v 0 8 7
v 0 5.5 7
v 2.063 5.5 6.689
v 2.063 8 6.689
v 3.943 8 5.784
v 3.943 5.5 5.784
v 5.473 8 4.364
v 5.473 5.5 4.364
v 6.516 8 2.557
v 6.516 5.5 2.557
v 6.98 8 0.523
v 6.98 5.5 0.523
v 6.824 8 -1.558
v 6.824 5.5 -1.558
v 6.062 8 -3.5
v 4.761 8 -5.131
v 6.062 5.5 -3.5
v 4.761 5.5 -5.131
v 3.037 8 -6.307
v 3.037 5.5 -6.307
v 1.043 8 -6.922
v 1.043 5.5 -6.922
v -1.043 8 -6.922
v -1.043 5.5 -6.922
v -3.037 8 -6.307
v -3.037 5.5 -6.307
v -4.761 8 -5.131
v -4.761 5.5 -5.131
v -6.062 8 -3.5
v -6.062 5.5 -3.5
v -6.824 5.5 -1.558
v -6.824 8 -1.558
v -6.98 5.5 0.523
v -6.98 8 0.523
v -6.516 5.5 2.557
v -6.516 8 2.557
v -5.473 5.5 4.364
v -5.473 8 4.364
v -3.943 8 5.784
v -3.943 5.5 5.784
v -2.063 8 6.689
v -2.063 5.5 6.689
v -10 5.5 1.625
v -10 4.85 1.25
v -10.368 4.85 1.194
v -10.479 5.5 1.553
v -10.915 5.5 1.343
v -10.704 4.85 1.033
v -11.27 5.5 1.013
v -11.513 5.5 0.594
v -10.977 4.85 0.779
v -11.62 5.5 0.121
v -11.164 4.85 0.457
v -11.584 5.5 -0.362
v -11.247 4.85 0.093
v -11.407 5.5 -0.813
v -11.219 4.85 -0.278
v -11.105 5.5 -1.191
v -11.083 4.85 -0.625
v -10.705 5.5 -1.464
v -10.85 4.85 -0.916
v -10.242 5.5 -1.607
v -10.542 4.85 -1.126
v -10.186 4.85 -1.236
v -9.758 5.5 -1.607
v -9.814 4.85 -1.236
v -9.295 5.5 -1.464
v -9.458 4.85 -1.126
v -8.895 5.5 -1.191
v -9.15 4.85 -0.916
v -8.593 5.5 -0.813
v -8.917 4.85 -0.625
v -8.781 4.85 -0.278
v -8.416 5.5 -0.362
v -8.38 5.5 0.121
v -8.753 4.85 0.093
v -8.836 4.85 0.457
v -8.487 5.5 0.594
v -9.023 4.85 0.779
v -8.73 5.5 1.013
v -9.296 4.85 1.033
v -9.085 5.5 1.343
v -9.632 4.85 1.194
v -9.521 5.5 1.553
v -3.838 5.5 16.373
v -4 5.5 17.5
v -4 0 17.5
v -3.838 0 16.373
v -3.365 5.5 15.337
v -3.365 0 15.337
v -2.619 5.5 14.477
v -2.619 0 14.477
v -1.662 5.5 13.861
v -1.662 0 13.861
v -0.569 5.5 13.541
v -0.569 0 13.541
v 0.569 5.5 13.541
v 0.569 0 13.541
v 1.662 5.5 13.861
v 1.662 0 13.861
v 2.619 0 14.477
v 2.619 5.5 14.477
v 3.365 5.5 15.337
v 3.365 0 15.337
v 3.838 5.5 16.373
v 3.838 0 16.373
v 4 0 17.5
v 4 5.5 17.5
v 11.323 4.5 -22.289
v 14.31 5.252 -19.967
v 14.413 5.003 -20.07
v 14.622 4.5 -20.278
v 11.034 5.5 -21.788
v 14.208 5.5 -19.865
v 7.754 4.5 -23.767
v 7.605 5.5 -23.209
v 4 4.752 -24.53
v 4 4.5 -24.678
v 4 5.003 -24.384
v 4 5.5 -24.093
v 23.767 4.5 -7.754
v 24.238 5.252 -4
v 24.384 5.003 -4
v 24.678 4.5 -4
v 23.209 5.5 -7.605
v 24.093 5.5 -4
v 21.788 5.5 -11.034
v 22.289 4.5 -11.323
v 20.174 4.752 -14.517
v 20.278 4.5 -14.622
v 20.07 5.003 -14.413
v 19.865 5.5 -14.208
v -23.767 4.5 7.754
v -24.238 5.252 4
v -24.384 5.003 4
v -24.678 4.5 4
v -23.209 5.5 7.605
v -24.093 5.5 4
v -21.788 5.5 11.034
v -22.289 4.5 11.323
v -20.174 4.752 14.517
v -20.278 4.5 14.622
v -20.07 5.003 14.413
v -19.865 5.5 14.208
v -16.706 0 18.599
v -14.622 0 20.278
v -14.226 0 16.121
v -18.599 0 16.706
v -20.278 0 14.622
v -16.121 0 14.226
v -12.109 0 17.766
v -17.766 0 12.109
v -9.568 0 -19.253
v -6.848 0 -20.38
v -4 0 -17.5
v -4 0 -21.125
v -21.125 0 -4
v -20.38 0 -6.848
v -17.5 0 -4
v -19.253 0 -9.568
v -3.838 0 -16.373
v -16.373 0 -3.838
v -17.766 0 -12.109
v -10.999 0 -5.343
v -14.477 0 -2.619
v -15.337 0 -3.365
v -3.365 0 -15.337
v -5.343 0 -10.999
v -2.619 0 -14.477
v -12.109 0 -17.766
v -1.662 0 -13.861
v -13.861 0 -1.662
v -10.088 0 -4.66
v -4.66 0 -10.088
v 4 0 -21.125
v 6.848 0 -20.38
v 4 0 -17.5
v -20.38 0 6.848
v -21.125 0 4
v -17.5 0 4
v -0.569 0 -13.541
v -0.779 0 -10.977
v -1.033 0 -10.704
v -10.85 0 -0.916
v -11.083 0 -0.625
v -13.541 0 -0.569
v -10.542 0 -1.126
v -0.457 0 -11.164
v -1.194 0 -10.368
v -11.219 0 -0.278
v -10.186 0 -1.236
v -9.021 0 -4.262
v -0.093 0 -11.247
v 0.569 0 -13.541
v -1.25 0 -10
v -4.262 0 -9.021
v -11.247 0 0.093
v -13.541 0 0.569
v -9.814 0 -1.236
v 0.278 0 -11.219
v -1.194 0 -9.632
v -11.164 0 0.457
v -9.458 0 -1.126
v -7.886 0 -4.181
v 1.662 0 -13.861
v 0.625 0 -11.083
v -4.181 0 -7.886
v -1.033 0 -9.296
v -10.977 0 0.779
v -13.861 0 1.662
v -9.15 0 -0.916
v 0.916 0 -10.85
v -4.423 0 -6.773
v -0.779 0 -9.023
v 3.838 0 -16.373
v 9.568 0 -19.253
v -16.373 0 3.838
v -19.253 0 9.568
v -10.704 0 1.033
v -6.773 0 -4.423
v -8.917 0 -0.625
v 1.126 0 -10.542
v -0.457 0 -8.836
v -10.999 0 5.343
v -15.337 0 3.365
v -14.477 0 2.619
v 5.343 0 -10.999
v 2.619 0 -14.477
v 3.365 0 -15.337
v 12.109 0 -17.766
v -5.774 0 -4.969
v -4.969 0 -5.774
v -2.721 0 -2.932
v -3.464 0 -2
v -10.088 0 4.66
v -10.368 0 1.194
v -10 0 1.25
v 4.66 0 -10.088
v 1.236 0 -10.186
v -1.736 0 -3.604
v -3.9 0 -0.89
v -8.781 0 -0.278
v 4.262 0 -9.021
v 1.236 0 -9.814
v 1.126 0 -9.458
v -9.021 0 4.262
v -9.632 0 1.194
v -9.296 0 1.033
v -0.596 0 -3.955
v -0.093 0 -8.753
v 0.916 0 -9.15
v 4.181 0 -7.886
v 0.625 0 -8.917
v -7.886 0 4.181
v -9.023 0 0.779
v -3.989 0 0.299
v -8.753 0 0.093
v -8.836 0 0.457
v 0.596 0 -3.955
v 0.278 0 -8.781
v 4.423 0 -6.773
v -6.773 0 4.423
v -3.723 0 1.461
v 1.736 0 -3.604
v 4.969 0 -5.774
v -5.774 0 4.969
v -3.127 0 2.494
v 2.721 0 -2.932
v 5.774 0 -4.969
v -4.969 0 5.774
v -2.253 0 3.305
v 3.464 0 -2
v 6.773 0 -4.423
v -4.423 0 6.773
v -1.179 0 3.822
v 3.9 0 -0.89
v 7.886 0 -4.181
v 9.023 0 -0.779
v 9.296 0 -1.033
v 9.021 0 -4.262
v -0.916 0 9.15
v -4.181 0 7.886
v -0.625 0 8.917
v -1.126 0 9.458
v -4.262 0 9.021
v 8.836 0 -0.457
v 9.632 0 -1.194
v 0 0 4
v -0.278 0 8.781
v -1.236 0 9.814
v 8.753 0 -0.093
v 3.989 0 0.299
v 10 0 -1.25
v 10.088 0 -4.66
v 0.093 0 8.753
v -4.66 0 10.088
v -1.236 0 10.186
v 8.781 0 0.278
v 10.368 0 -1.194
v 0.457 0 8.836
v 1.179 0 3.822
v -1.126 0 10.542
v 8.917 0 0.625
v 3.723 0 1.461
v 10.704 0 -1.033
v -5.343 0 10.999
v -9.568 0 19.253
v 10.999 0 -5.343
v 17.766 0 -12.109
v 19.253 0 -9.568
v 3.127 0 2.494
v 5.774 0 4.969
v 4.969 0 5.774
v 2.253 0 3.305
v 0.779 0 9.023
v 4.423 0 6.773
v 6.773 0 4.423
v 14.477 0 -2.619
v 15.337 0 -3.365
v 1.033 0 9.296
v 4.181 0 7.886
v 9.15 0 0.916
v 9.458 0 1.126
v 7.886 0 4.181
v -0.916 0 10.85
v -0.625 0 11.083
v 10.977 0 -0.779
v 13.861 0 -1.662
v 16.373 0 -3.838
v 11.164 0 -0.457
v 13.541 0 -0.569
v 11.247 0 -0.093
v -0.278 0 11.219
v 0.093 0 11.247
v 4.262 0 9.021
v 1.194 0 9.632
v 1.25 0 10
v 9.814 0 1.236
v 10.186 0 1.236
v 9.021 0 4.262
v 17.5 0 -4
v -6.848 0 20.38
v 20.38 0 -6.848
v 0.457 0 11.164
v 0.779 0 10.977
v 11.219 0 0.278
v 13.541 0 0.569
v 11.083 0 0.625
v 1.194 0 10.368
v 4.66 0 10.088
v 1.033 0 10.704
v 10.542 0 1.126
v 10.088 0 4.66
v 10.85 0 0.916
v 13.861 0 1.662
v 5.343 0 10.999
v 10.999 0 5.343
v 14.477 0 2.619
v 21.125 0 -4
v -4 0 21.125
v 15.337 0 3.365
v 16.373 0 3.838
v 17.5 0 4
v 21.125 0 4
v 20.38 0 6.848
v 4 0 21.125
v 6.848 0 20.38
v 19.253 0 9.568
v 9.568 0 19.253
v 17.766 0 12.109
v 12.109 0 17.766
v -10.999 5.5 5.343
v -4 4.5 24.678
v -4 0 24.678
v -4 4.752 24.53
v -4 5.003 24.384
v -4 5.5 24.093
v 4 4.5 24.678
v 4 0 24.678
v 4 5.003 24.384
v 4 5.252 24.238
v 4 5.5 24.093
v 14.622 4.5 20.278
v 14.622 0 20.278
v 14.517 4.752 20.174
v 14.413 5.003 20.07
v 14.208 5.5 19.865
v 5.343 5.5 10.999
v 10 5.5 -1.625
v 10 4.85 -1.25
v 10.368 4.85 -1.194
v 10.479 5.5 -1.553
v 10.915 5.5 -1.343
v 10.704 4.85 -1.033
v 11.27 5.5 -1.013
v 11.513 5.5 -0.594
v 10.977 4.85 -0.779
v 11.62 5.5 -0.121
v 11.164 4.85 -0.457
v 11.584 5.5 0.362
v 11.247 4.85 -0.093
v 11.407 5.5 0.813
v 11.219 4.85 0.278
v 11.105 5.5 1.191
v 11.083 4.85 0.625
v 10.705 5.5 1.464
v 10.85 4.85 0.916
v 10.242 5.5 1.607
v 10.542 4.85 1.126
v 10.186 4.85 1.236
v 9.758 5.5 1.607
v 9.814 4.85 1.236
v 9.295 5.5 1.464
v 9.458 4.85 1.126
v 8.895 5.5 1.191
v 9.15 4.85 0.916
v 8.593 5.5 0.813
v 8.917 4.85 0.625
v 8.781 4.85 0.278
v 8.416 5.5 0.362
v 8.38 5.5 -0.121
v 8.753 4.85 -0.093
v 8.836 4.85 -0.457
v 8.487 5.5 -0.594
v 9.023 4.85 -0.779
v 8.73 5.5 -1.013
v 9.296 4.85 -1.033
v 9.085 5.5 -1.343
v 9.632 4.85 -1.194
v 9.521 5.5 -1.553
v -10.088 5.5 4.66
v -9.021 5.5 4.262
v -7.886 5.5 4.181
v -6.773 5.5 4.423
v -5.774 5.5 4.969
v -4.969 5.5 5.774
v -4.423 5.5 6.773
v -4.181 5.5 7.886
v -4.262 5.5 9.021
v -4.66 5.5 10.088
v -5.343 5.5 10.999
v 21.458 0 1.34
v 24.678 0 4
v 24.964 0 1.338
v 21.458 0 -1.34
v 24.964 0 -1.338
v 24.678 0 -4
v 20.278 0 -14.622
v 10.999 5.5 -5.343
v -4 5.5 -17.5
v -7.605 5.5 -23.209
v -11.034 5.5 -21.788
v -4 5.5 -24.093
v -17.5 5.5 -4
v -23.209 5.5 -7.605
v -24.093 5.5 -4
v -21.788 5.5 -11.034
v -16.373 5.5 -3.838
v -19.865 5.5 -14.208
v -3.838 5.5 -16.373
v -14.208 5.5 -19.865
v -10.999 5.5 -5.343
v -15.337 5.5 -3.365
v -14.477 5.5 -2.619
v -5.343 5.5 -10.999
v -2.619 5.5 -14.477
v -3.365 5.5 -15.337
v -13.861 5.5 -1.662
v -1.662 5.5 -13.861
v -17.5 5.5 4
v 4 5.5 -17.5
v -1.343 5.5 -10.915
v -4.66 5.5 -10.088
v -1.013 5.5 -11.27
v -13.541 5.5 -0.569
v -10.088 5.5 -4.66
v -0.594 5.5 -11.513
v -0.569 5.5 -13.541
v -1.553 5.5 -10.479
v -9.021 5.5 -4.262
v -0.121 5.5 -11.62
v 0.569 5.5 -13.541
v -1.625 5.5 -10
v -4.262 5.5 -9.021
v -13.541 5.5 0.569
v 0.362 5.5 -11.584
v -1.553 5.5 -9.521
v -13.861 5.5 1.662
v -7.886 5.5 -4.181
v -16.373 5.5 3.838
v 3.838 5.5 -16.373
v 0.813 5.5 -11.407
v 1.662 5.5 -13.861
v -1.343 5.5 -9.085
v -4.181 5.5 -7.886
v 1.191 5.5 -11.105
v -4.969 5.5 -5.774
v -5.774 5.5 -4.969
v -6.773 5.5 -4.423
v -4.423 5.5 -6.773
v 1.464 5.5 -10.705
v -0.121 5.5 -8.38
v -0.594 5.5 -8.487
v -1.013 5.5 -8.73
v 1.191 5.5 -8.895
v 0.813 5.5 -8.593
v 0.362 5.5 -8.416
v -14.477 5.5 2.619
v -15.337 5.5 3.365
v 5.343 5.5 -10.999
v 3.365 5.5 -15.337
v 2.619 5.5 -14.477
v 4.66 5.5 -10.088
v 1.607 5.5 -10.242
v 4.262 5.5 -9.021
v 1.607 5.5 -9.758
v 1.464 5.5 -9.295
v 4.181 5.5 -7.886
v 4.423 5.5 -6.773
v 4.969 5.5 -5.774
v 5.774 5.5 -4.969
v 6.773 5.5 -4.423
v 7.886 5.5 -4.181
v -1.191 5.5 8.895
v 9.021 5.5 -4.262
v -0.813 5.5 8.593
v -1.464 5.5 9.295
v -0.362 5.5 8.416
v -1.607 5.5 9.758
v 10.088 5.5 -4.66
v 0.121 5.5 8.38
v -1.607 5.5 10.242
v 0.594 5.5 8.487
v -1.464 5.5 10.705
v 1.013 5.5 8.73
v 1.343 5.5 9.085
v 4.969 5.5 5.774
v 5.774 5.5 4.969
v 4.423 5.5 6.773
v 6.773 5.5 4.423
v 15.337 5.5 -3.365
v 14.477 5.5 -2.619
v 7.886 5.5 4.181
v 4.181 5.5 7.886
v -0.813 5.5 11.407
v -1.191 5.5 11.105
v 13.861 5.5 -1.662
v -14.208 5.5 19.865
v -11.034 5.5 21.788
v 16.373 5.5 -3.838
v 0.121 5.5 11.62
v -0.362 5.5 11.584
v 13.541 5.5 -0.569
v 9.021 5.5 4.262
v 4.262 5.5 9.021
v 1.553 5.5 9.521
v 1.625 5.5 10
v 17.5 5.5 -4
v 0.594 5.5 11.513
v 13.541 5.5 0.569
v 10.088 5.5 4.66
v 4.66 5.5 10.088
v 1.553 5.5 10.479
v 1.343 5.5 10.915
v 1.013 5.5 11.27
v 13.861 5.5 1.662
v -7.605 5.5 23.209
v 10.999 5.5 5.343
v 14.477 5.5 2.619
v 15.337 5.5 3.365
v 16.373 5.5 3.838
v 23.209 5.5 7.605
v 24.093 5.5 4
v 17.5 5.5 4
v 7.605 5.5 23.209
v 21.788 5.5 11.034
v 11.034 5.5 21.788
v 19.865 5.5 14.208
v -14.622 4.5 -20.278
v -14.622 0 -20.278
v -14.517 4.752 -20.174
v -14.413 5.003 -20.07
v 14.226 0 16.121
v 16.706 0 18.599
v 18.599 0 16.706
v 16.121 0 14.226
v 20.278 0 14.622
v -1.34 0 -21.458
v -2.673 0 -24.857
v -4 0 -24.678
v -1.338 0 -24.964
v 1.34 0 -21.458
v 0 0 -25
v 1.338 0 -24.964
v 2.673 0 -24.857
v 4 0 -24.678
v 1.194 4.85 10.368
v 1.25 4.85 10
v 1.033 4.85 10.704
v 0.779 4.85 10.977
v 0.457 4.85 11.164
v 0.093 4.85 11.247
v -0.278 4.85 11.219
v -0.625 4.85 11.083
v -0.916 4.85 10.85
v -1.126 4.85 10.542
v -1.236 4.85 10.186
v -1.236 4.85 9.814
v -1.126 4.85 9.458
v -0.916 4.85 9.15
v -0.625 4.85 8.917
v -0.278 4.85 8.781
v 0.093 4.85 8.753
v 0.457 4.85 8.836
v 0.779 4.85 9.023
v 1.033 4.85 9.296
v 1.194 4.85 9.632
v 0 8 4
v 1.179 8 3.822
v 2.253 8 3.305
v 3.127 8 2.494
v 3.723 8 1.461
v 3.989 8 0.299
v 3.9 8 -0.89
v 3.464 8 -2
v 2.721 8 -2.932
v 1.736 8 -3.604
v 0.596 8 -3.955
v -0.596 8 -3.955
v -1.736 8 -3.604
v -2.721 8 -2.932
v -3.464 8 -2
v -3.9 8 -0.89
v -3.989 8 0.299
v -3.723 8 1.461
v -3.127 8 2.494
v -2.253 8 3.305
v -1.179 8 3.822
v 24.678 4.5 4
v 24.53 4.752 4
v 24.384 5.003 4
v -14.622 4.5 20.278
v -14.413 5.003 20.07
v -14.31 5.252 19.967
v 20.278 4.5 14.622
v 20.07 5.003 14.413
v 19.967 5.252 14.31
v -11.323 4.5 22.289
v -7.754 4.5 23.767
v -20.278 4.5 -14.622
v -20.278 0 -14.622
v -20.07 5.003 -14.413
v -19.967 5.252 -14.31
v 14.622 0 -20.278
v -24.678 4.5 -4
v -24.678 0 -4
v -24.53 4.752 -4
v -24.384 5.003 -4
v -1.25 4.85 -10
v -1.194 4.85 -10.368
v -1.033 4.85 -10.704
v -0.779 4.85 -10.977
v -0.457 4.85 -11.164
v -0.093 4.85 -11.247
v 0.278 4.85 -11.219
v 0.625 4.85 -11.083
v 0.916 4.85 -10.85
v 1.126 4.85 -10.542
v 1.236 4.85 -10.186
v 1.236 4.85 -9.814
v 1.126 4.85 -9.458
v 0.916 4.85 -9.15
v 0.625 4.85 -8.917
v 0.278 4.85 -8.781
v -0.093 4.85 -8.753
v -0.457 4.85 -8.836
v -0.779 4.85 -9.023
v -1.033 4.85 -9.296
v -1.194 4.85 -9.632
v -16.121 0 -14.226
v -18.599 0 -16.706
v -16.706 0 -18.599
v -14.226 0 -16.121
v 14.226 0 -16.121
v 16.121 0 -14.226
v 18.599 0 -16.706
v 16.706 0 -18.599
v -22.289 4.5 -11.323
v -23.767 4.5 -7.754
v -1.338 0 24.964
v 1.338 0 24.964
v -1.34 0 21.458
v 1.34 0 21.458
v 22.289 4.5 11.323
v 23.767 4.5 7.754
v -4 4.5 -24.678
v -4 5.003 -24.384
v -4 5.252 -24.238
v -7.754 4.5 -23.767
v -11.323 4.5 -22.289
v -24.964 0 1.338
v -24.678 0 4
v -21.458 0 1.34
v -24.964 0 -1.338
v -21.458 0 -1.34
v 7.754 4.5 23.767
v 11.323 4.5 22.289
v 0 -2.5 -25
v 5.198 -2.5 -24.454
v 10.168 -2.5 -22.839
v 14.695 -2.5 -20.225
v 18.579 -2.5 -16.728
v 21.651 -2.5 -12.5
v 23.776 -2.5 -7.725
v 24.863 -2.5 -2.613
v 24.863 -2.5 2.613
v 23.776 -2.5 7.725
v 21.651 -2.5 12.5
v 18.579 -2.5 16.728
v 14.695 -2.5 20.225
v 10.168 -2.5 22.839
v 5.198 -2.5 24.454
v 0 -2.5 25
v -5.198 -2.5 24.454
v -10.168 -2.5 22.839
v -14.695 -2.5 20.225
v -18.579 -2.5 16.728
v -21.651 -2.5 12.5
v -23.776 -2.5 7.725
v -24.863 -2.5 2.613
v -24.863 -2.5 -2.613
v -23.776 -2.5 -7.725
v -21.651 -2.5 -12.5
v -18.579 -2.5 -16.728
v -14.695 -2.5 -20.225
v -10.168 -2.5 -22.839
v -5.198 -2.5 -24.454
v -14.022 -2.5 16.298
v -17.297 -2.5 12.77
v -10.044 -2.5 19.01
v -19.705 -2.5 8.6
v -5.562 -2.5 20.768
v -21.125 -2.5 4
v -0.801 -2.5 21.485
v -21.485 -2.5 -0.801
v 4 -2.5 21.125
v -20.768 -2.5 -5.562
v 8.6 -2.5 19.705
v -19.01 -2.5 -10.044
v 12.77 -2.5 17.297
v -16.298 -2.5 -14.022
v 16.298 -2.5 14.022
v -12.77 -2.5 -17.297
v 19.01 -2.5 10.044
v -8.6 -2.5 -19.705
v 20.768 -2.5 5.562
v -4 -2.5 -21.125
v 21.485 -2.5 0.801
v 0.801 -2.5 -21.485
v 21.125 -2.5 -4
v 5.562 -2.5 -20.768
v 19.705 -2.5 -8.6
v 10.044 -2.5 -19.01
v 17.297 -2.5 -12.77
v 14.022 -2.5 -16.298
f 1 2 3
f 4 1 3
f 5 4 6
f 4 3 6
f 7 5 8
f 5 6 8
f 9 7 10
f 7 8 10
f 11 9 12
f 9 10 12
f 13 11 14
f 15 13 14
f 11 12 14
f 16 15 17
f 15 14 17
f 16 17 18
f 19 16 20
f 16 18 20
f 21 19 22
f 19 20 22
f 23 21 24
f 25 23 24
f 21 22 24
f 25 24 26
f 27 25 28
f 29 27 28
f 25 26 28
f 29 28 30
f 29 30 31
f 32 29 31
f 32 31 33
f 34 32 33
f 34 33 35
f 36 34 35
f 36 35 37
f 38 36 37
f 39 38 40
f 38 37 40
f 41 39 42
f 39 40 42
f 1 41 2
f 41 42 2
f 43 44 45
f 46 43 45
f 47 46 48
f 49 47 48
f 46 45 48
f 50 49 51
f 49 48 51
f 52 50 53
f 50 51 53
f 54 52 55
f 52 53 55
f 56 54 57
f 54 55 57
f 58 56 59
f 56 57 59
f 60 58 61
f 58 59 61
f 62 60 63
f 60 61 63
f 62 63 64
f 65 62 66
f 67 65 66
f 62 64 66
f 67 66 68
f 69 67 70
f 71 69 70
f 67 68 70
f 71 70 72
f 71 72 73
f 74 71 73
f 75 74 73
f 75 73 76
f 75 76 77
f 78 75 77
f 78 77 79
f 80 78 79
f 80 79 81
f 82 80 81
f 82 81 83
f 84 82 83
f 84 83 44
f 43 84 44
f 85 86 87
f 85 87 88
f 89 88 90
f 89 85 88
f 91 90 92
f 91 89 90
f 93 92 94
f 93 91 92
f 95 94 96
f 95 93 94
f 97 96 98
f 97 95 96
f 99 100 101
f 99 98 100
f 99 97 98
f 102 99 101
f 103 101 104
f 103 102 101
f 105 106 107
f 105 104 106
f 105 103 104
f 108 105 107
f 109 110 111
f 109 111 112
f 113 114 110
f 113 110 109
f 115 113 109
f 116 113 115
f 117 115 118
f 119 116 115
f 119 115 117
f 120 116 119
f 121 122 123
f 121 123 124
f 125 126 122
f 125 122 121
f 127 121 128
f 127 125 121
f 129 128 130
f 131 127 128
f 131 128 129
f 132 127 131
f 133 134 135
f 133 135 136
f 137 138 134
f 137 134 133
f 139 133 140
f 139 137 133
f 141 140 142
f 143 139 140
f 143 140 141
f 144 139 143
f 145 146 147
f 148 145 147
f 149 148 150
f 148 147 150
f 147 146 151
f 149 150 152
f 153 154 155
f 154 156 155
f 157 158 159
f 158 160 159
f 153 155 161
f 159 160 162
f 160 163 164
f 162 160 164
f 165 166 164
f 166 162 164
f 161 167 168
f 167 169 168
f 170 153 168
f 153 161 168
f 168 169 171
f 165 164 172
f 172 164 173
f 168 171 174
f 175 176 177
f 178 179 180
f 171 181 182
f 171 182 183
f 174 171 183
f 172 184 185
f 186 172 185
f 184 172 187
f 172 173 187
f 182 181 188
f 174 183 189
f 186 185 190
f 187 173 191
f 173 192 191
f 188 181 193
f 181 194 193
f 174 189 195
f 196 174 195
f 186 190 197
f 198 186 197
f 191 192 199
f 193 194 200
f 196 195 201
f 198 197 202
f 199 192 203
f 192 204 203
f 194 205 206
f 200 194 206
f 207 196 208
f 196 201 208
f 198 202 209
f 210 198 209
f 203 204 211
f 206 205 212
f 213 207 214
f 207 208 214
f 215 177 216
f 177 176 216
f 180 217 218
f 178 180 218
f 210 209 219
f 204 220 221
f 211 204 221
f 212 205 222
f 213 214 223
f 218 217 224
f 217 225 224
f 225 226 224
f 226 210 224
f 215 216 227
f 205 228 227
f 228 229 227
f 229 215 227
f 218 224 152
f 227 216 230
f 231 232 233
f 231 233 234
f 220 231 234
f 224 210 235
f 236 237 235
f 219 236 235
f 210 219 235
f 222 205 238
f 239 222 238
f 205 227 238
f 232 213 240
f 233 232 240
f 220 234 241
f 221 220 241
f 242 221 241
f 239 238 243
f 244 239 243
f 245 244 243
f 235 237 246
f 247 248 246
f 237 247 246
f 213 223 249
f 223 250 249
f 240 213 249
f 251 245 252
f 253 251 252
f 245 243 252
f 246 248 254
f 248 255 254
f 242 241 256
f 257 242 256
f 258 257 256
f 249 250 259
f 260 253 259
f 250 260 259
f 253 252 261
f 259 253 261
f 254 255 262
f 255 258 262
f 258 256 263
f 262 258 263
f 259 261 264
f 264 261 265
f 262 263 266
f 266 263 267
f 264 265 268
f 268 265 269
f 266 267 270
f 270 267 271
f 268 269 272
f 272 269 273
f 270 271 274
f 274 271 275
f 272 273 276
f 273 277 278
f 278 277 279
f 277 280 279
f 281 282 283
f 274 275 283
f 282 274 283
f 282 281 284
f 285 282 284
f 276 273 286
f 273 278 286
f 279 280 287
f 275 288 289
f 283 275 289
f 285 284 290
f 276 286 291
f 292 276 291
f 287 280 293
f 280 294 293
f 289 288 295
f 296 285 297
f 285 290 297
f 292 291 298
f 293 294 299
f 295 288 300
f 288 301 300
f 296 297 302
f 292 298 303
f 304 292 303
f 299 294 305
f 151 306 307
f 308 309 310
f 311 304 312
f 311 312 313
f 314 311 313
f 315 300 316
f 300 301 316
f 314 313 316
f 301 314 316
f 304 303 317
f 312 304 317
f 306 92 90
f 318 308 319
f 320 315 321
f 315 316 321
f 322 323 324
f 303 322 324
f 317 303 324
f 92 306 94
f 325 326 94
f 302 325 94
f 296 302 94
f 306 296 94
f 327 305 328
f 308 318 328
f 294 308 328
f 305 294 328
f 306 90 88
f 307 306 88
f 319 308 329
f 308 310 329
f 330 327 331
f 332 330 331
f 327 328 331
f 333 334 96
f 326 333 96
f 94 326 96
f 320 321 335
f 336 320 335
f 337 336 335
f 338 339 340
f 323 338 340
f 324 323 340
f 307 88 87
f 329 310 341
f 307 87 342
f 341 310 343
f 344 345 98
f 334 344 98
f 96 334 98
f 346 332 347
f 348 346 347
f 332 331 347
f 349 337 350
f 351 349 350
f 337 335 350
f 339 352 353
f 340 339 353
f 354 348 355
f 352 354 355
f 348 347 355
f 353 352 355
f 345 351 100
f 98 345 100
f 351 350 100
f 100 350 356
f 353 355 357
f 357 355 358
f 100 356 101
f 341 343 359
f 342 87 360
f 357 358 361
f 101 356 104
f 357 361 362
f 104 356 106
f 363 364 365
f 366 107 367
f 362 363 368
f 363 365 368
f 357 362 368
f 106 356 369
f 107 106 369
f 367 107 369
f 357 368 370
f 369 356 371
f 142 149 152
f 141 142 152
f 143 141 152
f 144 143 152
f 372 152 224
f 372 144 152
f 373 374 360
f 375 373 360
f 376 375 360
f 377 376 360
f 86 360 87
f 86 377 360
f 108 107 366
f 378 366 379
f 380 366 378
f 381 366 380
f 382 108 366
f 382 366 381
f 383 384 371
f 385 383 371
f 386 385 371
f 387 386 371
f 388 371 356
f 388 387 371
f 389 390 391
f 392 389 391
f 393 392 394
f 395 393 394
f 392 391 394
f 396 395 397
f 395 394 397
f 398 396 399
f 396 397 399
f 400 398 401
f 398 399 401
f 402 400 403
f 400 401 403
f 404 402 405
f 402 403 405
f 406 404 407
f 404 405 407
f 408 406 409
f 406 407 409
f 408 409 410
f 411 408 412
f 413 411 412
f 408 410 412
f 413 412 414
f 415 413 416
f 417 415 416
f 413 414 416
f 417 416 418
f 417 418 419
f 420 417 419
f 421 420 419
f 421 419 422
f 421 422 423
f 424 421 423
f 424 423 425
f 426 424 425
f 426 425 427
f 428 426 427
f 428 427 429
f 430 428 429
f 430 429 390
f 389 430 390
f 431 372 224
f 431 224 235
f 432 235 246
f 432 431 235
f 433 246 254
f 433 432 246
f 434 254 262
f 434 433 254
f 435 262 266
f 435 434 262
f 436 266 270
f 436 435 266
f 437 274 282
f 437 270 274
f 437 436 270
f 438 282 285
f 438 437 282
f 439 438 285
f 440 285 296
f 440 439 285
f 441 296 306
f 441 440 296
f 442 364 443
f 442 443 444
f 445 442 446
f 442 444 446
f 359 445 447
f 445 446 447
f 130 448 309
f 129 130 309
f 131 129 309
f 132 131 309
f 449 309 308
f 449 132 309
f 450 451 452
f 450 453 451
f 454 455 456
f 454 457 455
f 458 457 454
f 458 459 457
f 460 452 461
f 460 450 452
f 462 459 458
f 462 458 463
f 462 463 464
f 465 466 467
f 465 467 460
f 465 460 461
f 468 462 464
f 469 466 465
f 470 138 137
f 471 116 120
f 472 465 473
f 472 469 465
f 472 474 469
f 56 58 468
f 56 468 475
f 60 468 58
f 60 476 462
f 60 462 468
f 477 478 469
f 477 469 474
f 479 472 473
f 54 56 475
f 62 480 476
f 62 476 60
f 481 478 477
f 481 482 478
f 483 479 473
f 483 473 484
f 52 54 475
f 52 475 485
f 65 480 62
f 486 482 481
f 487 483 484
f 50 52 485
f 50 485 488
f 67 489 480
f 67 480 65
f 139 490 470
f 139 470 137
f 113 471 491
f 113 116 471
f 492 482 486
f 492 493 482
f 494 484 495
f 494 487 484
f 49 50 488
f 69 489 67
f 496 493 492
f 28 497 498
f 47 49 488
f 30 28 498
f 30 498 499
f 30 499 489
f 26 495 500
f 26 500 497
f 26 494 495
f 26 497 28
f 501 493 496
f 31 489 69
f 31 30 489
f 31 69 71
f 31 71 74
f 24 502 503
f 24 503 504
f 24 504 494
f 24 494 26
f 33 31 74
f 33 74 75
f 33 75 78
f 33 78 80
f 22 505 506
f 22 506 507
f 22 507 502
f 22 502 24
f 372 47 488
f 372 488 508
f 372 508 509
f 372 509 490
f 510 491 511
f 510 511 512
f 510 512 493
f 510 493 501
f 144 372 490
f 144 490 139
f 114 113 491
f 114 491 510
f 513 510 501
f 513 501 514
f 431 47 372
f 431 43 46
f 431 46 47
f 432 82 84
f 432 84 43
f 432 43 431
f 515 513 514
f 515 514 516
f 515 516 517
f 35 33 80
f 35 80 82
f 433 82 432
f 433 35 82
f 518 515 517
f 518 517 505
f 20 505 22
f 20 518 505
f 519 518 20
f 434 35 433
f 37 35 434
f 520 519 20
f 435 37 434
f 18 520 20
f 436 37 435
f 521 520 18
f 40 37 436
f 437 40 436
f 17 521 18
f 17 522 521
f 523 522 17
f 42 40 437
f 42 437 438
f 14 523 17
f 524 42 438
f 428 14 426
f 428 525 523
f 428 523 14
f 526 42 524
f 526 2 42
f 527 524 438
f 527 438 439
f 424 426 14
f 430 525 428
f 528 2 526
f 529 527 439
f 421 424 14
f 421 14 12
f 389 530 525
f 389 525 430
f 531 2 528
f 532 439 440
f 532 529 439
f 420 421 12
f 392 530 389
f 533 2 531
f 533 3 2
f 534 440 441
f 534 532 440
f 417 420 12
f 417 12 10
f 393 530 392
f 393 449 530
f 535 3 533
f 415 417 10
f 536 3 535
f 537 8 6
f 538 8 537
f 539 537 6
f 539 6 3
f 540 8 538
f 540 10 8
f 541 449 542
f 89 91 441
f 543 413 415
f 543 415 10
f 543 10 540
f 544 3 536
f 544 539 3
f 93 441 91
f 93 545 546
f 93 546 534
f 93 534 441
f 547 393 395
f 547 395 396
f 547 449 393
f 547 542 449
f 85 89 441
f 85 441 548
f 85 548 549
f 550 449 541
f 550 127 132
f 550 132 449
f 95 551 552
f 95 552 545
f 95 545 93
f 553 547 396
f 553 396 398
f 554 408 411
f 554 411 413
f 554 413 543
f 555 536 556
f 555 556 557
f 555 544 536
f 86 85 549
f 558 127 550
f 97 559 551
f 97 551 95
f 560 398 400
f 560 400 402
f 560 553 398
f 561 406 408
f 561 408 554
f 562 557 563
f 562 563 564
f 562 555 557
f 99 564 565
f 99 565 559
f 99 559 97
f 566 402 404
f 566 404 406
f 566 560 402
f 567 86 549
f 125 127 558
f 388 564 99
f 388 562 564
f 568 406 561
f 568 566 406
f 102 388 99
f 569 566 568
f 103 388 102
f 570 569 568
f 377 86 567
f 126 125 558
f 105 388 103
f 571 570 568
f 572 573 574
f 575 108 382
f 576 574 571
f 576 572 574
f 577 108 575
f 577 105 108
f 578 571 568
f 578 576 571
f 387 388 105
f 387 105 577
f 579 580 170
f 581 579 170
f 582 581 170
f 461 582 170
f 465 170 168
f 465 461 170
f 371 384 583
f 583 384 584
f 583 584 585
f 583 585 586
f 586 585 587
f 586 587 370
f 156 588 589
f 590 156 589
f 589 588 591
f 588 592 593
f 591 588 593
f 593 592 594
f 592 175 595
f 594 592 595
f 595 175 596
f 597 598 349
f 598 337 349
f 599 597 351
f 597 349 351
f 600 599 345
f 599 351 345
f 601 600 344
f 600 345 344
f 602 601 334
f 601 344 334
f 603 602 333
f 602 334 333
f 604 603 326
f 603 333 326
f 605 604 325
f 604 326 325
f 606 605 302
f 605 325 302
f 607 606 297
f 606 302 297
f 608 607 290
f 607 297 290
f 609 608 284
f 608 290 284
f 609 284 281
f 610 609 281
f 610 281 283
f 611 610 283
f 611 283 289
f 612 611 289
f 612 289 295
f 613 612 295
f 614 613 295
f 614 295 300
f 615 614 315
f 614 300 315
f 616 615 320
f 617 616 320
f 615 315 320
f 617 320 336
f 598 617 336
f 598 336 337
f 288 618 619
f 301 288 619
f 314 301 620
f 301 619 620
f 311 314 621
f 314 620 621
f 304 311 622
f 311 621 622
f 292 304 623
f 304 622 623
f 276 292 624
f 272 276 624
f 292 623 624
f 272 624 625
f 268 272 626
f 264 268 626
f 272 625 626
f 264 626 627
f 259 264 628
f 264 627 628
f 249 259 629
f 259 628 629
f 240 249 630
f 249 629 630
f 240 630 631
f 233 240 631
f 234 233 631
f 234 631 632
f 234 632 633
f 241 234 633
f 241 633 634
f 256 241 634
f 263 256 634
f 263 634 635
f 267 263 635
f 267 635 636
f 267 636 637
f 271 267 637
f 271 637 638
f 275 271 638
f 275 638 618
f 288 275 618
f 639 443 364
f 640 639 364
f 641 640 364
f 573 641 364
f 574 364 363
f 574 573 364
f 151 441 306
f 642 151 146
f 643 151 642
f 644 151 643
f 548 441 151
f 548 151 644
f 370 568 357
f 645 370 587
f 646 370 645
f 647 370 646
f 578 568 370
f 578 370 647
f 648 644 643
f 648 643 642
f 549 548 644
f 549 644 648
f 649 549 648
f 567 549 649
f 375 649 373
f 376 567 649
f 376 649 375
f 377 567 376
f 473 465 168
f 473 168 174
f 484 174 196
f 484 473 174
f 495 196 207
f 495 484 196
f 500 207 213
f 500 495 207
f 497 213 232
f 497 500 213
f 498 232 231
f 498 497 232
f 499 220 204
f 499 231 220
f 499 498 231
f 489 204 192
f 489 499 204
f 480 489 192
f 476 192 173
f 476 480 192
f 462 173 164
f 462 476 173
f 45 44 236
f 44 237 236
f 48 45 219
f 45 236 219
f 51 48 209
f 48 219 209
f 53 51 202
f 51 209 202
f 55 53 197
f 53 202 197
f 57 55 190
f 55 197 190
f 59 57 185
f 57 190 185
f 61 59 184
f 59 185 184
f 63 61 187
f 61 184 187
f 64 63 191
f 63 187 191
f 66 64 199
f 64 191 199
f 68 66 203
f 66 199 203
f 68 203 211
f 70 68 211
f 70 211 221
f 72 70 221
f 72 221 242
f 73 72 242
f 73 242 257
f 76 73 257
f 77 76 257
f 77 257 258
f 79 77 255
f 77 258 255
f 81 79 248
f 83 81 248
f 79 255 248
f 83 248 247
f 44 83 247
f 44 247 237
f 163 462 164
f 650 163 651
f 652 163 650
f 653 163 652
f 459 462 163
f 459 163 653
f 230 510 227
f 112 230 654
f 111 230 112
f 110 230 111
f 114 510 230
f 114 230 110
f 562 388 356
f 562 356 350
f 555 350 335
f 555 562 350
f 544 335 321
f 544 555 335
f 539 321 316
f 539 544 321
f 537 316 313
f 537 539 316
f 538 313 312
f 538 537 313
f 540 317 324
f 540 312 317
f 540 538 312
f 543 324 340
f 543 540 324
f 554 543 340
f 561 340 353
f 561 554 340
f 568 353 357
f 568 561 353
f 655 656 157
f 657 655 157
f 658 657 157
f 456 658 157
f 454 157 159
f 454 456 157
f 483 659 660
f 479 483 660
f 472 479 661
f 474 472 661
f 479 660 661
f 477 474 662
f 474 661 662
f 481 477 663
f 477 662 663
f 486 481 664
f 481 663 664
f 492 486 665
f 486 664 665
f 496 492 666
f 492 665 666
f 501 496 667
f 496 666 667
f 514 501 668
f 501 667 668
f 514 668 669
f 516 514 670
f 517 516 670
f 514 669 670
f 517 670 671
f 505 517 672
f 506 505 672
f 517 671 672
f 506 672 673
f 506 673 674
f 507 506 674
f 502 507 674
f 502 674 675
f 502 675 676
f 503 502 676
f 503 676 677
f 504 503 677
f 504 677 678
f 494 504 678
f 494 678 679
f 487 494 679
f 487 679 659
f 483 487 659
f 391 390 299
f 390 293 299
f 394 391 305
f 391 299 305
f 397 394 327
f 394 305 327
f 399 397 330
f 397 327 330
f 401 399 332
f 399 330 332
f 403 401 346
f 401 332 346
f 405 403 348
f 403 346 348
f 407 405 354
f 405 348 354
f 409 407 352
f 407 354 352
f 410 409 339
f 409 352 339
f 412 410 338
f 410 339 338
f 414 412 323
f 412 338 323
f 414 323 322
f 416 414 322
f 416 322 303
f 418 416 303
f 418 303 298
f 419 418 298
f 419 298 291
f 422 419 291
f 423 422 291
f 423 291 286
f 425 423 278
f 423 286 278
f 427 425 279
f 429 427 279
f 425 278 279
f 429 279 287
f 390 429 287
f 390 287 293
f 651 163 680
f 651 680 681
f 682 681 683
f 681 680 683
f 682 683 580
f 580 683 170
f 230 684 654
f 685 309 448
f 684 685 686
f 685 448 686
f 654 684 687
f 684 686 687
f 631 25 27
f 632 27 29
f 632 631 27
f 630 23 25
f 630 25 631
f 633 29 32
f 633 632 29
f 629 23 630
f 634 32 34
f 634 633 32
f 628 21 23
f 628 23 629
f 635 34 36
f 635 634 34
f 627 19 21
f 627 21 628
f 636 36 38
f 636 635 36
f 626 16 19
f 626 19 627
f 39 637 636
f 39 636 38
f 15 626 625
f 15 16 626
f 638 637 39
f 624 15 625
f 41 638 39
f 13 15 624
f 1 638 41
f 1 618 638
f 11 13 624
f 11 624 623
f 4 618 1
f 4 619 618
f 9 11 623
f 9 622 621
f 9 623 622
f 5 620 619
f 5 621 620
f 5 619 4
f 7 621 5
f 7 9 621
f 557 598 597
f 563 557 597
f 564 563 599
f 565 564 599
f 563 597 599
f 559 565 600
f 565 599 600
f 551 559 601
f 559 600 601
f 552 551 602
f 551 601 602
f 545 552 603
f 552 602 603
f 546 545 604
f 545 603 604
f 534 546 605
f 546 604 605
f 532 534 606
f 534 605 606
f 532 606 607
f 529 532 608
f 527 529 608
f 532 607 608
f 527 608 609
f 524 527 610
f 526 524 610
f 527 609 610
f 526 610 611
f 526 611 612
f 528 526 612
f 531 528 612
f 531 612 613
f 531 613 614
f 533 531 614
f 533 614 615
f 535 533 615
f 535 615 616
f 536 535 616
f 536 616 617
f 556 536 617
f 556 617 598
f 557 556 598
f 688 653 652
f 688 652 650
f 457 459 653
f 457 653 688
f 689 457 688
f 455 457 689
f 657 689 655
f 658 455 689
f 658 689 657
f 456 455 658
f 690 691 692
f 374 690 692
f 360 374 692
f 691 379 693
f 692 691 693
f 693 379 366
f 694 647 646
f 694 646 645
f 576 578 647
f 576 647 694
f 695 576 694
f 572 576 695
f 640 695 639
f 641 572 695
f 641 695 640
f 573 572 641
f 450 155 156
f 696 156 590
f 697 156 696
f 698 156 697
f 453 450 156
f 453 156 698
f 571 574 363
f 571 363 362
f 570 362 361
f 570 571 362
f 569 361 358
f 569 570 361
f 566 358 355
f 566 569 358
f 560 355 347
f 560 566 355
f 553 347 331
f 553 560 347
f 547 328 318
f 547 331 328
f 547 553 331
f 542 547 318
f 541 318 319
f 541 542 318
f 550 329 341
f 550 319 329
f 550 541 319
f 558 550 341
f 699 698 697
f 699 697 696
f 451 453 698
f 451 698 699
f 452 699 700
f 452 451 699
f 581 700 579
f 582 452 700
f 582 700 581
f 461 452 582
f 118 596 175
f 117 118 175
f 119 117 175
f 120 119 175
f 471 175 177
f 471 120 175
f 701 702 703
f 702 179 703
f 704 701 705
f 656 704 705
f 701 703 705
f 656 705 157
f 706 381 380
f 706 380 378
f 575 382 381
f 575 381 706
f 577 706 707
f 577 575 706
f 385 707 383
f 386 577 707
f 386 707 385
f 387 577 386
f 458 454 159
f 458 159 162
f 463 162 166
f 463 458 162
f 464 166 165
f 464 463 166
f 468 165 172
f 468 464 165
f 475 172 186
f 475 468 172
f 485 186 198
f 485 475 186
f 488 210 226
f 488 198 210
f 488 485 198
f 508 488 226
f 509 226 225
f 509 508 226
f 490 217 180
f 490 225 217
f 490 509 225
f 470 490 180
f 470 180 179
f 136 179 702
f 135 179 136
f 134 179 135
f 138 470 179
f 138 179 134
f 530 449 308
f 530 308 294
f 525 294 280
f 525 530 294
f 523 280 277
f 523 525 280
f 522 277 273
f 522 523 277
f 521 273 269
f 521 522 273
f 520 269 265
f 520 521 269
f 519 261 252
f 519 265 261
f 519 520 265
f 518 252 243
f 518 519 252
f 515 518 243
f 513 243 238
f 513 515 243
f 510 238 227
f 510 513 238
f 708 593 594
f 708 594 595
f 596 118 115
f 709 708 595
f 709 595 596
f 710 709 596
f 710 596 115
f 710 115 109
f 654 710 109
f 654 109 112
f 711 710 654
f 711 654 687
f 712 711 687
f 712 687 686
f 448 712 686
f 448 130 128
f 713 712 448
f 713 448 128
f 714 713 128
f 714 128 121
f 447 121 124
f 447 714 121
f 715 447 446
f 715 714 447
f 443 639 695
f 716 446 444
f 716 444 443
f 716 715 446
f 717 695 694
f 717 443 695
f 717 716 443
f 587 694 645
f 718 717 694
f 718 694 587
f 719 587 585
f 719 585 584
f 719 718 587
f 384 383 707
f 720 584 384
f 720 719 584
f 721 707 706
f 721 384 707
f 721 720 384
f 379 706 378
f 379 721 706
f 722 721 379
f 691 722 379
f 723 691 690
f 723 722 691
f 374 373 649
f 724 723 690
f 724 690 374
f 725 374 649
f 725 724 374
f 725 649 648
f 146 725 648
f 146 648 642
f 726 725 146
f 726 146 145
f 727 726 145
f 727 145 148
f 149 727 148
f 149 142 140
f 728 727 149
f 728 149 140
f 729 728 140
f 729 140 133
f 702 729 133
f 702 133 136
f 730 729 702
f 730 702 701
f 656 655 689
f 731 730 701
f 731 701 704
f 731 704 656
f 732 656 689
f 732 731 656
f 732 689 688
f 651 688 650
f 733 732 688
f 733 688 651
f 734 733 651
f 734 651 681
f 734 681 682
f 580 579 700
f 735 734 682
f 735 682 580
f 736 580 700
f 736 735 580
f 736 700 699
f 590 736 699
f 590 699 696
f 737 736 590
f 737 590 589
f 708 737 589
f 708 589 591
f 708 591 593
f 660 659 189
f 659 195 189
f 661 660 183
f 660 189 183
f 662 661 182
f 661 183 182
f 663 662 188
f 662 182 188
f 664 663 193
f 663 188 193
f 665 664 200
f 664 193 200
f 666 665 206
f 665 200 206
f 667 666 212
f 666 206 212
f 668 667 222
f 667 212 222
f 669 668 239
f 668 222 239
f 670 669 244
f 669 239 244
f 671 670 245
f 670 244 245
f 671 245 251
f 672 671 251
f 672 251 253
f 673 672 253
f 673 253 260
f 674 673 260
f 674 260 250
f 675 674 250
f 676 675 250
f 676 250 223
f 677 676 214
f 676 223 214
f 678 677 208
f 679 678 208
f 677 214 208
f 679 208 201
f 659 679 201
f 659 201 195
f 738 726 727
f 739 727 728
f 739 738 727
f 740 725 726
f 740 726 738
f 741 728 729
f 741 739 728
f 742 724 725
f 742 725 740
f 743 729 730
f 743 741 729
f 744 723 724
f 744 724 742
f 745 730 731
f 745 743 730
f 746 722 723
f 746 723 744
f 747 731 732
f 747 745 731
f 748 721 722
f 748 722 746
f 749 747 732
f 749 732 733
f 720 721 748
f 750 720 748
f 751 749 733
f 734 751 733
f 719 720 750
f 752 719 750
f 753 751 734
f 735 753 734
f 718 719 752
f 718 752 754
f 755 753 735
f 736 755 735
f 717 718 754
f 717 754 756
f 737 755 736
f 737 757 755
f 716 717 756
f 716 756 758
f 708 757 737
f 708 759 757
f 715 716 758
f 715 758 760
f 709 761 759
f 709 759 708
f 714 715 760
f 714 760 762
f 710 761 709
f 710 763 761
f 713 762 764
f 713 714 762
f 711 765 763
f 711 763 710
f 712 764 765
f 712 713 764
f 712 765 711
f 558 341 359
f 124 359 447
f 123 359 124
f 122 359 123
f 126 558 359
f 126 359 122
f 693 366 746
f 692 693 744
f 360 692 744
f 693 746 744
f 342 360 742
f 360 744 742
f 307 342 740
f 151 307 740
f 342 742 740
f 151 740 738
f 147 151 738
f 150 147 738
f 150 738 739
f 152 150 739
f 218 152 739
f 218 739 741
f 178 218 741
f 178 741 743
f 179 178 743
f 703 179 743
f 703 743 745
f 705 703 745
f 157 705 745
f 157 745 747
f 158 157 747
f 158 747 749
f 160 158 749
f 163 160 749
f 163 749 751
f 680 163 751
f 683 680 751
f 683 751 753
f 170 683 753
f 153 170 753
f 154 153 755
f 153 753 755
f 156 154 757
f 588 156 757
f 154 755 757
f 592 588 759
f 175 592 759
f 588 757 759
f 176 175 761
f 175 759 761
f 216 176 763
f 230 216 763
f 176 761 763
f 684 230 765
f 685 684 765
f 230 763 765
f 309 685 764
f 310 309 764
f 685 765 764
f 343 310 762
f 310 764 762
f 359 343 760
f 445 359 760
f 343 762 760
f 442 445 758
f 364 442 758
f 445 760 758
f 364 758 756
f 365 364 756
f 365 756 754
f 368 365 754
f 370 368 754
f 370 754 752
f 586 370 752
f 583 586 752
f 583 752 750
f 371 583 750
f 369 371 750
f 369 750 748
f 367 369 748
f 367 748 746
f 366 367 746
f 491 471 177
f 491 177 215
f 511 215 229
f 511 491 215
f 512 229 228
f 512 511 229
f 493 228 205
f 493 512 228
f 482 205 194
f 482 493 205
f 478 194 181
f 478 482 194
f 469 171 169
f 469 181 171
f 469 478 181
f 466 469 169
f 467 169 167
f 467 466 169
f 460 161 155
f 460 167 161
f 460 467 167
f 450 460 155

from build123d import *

# Parameters (mm, degrees)
SKETCH2_R                       = 25
BOSS_EXTRUDE1_DEPTH             = 5.5
CHAMFER1_SIZE                   = 1
CHAMFER1_SIZE2                  = 0.577350269
SKETCH3_R                       = 7
BOSS_EXTRUDE2_DEPTH             = 2.5
M3X0_5_TAPPED_HOLE1_D           = 2.5
M3X0_5_TAPPED_HOLE1_CSINK_D     = 3.25
M3X0_5_TAPPED_HOLE1_CSINK_ANGLE = 60
SKETCH8_R                       = 4
CUT_EXTRUDE1_DEPTH              = 37.249137921
CUT_EXTRUDE2_DEPTH              = 36.780581326
CUT_EXTRUDE3_DEPTH              = 36.780581326
CIRPATTERN1_COUNT               = 4
BOSS_EXTRUDE3_START             = 2.5
SKETCH11_R                      = 25
SKETCH11_R_2                    = 21.5
BOSS_EXTRUDE3_DEPTH             = 2.5


with BuildPart() as part:
    # Sketch2 → Boss-Extrude1 (new body)
    with BuildSketch(Plane(origin=(0, 0, 0), x_dir=(1, 0, 0), z_dir=(0, 1, 0))):
        with Locations(Location((0, 0, 0), (0, 0, 270))):
            Circle(SKETCH2_R)
    extrude(amount=BOSS_EXTRUDE1_DEPTH)

    # Chamfer1
    chamfer1_edges = [part.edges().sort_by_distance(p)[0] for p in [
        (0, 5.5, -25),
    ]]
    chamfer1_side = [part.faces().sort_by_distance(p)[0] for p in [
        (0, 2.75, -25),
    ]]
    chamfer(chamfer1_edges, length=CHAMFER1_SIZE, length2=CHAMFER1_SIZE2, reference=chamfer1_side[0])

    # Sketch3 → Boss-Extrude2 (add)
    with BuildSketch(Plane(origin=(0, 5.5, 0), x_dir=(1, 0, 0), z_dir=(0, 1, 0))):
        with Locations(Location((0, 0, 0), (0, 0, 270))):
            Circle(SKETCH3_R)
    extrude(amount=BOSS_EXTRUDE2_DEPTH)

    # M3x0.5 Tapped Hole1 (through all)
    with Locations(Plane(origin=(0, 5.5, 0), x_dir=(1, 0, 0), z_dir=(0, 1, 0))):
        with Locations((0, 10)):
            m3x0_5_tapped_hole1 = CounterSinkHole(M3X0_5_TAPPED_HOLE1_D / 2, M3X0_5_TAPPED_HOLE1_CSINK_D / 2, counter_sink_angle=M3X0_5_TAPPED_HOLE1_CSINK_ANGLE)

    # Sketch8 → Cut-Extrude1 (cut, through all)
    with BuildSketch(Plane(origin=(0, 8, 0), x_dir=(1, 0, 0), z_dir=(0, 1, 0))):
        with Locations(Location((0, 0, 0), (0, 0, 270))):
            Circle(SKETCH8_R)
    extrude(amount=-CUT_EXTRUDE1_DEPTH, mode=Mode.SUBTRACT)

    # Sketch9 → Cut-Extrude2 (cut, through all)
    with BuildSketch(Plane(origin=(0, 5.5, 0), x_dir=(1, 0, 0), z_dir=(0, 1, 0))):
        with BuildLine():
            Line((4, 32.5), (4, 17.5))
            ThreePointArc((4, 17.5), (0, 13.5), (-4, 17.5))
            Line((-4, 17.5), (-4, 32.5))
            ThreePointArc((-4, 32.5), (0, 36.5), (4, 32.5))
        make_face()
    cut_extrude2 = extrude(amount=-CUT_EXTRUDE2_DEPTH, mode=Mode.SUBTRACT)

    # Sketch10 → Cut-Extrude3 (cut, through all)
    with BuildSketch(Plane(origin=(0, 5.5, 0), x_dir=(1, 0, 0), z_dir=(0, 1, 0))):
        with BuildLine():
            Line((-23.539452544, 29.196306793), (-5.342535685, 10.999389935))
            ThreePointArc((-5.342535685, 10.999389935), (-5.342535685, 5.342535685), (-10.999389935, 5.342535685))
            Line((-10.999389935, 5.342535685), (-29.196306793, 23.539452544))
            ThreePointArc((-29.196306793, 23.539452544), (-29.196306793, 29.196306793), (-23.539452544, 29.196306793))
        make_face()
    cut_extrude3 = extrude(amount=-CUT_EXTRUDE3_DEPTH, mode=Mode.SUBTRACT)

    # CirPattern1: M3x0.5 Tapped Hole1, Cut-Extrude2, Cut-Extrude3 ×4 about axis
    cirpattern1_axis = Axis((0, 0, 0), (0, 1, 0))
    add([m3x0_5_tapped_hole1.rotate(cirpattern1_axis, i * 360 / CIRPATTERN1_COUNT) for i in range(1, CIRPATTERN1_COUNT)], mode=Mode.SUBTRACT)
    add([cut_extrude2.rotate(cirpattern1_axis, i * 360 / CIRPATTERN1_COUNT) for i in range(1, CIRPATTERN1_COUNT)], mode=Mode.SUBTRACT)
    add([cut_extrude3.rotate(cirpattern1_axis, i * 360 / CIRPATTERN1_COUNT) for i in range(1, CIRPATTERN1_COUNT)], mode=Mode.SUBTRACT)

    # Sketch11 → Boss-Extrude3 (add)
    with BuildSketch(Plane.XZ.offset(BOSS_EXTRUDE3_START)):
        with Locations(Location((0, 0, 0), (0, 0, 270))):
            Circle(SKETCH11_R)
        with Locations(Location((0, 0, 0), (0, 0, 79.277847584))):
            Circle(SKETCH11_R_2, mode=Mode.SUBTRACT)
    extrude(amount=-BOSS_EXTRUDE3_DEPTH)


solid = part.part
